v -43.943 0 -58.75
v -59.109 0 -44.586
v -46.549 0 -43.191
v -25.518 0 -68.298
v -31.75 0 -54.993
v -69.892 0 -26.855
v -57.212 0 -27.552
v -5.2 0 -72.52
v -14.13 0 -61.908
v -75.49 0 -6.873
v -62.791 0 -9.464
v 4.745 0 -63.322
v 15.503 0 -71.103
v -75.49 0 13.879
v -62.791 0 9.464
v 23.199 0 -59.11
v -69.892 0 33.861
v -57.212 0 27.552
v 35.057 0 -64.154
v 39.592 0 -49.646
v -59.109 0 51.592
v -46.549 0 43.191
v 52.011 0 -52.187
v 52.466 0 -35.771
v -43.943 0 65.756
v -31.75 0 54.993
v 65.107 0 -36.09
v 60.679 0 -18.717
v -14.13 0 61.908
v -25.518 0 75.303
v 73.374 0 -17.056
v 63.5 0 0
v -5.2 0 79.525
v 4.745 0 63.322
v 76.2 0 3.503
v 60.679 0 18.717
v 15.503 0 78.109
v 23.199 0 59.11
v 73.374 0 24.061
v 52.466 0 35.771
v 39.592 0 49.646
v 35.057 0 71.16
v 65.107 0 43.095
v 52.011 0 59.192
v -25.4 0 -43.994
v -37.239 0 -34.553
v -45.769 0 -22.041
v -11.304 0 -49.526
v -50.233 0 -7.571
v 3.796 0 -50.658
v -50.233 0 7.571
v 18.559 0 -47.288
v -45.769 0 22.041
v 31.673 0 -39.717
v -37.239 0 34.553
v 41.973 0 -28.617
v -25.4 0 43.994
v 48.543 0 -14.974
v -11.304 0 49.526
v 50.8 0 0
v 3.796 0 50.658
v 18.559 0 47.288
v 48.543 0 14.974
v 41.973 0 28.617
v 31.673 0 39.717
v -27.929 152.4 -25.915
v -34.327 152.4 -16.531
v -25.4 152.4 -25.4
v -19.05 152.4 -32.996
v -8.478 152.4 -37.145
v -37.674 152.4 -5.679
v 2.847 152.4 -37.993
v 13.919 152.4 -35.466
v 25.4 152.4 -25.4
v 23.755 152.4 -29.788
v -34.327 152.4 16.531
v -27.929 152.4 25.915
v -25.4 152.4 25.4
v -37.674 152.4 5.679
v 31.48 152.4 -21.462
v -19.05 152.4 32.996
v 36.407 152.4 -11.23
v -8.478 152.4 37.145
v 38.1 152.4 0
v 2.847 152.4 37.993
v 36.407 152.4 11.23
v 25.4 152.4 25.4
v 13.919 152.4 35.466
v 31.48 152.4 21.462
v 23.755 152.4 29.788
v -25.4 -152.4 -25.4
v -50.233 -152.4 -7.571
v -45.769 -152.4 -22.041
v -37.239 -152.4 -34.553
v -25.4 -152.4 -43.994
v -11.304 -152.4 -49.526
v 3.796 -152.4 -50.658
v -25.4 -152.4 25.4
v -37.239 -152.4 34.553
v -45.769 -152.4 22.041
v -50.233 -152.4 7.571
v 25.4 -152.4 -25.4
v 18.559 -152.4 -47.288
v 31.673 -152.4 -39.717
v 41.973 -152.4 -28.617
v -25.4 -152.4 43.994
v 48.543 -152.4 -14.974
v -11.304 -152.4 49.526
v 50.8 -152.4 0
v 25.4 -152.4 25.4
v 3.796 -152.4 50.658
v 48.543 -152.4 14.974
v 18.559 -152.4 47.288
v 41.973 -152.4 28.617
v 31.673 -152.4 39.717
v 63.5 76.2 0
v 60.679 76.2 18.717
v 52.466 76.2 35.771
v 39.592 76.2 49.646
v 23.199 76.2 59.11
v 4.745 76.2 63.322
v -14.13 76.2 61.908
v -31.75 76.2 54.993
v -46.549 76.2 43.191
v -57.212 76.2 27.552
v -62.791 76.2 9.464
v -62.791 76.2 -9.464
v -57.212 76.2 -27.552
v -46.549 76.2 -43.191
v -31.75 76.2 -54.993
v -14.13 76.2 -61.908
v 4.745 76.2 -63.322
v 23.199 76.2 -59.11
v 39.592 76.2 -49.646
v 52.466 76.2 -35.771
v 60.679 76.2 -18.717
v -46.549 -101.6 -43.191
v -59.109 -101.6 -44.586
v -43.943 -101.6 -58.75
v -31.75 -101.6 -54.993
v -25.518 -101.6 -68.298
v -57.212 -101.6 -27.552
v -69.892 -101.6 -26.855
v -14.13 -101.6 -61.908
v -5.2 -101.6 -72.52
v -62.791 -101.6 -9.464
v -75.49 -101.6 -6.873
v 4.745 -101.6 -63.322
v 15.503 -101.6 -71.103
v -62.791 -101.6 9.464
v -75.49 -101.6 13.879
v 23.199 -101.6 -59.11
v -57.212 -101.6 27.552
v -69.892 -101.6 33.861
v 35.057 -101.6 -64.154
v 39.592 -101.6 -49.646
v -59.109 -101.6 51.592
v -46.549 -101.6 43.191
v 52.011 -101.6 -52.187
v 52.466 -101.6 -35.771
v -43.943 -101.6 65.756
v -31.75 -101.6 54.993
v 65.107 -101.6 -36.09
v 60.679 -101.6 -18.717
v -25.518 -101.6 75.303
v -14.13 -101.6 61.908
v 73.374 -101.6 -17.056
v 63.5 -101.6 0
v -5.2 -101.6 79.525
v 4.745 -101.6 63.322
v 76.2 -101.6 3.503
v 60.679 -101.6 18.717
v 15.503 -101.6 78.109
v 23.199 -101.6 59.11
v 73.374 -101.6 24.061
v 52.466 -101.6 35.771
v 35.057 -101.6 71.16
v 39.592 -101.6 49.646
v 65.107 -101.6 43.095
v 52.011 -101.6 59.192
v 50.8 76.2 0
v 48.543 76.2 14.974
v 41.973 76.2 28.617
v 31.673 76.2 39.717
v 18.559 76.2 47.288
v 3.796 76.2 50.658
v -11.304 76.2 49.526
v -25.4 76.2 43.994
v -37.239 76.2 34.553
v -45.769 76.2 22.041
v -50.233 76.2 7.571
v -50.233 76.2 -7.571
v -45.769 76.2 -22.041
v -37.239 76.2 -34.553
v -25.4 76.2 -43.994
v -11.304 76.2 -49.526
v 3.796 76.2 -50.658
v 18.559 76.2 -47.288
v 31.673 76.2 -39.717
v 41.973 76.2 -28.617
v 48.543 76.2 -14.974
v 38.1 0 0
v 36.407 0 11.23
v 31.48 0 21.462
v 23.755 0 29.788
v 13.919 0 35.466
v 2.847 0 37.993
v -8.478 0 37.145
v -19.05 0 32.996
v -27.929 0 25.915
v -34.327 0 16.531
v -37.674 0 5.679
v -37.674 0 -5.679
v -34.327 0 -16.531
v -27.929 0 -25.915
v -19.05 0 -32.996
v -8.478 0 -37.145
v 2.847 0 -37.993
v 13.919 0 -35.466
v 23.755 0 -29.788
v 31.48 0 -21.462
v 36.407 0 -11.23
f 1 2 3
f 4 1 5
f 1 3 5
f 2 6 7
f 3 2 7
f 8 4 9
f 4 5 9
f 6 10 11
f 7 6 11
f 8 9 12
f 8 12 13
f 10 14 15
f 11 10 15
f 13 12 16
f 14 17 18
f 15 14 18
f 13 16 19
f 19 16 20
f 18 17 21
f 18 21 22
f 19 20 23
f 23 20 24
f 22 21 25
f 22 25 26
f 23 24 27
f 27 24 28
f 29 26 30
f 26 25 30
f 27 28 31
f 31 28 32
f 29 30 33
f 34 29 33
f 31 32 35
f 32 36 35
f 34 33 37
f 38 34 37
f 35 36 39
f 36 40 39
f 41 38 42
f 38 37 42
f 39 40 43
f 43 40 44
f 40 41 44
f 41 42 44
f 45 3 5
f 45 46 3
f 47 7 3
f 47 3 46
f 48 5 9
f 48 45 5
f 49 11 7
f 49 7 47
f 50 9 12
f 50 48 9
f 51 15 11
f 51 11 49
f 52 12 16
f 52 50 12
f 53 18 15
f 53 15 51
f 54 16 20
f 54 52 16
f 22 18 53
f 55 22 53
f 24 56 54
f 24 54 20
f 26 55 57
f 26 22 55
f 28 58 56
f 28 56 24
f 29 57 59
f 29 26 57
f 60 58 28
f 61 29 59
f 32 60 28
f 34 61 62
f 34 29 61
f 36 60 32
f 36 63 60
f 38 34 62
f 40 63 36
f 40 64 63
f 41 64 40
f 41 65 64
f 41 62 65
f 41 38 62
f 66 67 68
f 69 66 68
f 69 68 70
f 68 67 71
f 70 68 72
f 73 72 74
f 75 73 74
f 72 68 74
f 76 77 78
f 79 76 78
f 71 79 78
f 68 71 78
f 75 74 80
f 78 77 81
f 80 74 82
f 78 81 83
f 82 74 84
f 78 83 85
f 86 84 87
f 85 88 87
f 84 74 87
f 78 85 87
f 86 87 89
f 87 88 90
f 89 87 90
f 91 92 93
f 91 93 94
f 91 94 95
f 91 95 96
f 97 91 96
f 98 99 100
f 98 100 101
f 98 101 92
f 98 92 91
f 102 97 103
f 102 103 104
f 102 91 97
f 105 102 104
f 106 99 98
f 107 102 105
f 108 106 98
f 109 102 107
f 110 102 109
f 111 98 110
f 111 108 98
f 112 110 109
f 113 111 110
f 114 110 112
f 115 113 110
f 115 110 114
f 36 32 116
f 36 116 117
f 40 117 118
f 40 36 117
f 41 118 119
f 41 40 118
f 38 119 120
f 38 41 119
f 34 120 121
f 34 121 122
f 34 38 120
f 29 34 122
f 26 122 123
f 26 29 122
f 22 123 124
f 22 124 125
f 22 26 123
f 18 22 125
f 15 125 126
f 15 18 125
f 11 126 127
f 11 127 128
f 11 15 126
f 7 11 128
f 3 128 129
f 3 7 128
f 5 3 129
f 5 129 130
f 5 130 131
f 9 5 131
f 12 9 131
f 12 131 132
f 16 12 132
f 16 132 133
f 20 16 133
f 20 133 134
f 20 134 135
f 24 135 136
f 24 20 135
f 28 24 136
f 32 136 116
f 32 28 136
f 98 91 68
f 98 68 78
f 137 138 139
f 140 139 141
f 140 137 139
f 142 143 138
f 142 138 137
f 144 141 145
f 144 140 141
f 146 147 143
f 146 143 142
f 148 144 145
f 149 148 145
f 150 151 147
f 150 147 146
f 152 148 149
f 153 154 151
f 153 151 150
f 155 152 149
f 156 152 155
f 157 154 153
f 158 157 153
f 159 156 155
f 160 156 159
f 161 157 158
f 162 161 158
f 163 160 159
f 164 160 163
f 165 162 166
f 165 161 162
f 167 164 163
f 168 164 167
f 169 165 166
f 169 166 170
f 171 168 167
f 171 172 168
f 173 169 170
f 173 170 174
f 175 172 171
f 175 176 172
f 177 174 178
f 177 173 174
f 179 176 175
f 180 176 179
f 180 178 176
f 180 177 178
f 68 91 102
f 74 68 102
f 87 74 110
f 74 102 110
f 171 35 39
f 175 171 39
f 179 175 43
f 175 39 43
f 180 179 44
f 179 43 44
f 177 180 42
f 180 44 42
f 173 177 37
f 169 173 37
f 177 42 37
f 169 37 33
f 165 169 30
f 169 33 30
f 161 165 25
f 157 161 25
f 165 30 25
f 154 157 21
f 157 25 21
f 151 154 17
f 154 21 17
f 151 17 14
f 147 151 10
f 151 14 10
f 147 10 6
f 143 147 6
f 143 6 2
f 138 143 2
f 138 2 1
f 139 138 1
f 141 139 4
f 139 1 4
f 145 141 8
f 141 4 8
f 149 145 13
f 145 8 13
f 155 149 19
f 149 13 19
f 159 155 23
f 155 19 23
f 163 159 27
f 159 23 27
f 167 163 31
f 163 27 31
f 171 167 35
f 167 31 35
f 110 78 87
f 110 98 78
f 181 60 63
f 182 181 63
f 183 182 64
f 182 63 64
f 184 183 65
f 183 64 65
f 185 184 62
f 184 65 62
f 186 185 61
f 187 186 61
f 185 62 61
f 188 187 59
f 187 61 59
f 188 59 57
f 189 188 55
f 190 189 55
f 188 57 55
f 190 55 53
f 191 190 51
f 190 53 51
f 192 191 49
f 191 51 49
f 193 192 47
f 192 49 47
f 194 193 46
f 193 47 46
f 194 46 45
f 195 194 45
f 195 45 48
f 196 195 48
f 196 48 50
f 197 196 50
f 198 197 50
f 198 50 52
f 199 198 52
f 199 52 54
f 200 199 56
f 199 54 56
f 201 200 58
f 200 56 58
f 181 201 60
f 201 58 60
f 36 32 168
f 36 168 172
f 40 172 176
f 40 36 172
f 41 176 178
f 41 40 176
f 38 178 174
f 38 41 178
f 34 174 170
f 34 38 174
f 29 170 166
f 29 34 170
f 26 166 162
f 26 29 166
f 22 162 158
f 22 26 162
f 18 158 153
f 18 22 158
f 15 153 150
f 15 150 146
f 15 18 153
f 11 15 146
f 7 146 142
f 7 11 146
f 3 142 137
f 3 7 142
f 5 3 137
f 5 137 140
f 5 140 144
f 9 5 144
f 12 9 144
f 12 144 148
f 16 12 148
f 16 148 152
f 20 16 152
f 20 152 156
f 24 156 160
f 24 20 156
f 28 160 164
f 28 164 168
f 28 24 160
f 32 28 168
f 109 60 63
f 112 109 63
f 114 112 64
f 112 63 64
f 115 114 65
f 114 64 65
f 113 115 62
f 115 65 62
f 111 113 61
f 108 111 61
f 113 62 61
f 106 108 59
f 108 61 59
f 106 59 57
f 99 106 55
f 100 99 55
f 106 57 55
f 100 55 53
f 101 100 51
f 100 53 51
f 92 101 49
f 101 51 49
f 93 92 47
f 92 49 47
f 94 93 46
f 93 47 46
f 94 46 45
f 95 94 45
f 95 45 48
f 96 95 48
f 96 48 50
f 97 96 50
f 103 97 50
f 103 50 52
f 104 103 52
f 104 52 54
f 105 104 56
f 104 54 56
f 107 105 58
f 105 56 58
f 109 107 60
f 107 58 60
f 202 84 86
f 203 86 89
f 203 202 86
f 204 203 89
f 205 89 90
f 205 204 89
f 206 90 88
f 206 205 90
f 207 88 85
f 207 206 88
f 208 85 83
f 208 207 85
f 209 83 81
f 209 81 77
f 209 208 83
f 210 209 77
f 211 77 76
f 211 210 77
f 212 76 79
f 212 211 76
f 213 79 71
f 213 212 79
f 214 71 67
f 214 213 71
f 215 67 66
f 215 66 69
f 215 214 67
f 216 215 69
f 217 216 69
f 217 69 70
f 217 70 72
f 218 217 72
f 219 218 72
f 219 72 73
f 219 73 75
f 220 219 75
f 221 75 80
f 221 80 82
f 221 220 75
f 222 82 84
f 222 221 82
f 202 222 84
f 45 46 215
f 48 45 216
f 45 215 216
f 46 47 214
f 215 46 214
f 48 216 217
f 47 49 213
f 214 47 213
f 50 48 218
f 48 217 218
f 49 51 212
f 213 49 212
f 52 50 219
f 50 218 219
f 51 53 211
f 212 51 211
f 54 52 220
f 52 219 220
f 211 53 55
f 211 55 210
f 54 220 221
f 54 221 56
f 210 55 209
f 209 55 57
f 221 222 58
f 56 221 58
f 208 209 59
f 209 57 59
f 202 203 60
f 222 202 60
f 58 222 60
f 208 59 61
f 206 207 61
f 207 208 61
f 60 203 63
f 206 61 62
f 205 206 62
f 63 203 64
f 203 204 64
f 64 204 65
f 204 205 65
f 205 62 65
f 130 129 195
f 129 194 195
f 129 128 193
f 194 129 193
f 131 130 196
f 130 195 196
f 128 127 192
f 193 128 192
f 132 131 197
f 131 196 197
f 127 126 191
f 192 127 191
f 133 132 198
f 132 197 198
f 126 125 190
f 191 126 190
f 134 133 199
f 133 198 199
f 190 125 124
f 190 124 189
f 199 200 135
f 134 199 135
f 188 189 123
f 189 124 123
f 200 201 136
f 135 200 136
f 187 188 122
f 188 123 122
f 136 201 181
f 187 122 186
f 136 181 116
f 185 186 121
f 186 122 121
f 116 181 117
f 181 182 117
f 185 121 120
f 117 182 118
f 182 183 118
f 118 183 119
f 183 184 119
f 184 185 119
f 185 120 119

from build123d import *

# Parameters (mm, degrees)
F0_R     = 76.2
F0_R_2   = 63.5
F1_DEPTH = 101.6
F0_R_3   = 50.8
F2_DEPTH = 76.2
F0_R_4   = 38.1
F3_DEPTH = 152.4
F0_W     = 50.8
F0_H     = 50.8
F4_DEPTH = 152.4


with BuildPart() as f1:
    # F0 (on Front) → F1 (new body)
    with BuildSketch(Plane.XZ):
        with Locations((0, 3.502742)):
            Circle(F0_R)
        Circle(F0_R_2, mode=Mode.SUBTRACT)
    extrude(amount=F1_DEPTH)

    # F0 (on Front) → F2 (join)
    with BuildSketch(Plane.XZ):
        Circle(F0_R_2)
        Circle(F0_R_3, mode=Mode.SUBTRACT)
    extrude(amount=-F2_DEPTH)


with BuildPart() as f3:
    # F0 (on Front) → F3 (new body)
    with BuildSketch(Plane.XZ):
        Circle(F0_R_3)
        Circle(F0_R_4, mode=Mode.SUBTRACT)
    extrude(amount=F3_DEPTH)

    # F0 (on Front) → F4 (join, symmetric)
    with BuildSketch(Plane.XZ):
        Circle(F0_R_4)
        Rectangle(F0_W, F0_H, mode=Mode.SUBTRACT)
    extrude(amount=F4_DEPTH, both=True)


solid = Compound([f1.part, f3.part])
